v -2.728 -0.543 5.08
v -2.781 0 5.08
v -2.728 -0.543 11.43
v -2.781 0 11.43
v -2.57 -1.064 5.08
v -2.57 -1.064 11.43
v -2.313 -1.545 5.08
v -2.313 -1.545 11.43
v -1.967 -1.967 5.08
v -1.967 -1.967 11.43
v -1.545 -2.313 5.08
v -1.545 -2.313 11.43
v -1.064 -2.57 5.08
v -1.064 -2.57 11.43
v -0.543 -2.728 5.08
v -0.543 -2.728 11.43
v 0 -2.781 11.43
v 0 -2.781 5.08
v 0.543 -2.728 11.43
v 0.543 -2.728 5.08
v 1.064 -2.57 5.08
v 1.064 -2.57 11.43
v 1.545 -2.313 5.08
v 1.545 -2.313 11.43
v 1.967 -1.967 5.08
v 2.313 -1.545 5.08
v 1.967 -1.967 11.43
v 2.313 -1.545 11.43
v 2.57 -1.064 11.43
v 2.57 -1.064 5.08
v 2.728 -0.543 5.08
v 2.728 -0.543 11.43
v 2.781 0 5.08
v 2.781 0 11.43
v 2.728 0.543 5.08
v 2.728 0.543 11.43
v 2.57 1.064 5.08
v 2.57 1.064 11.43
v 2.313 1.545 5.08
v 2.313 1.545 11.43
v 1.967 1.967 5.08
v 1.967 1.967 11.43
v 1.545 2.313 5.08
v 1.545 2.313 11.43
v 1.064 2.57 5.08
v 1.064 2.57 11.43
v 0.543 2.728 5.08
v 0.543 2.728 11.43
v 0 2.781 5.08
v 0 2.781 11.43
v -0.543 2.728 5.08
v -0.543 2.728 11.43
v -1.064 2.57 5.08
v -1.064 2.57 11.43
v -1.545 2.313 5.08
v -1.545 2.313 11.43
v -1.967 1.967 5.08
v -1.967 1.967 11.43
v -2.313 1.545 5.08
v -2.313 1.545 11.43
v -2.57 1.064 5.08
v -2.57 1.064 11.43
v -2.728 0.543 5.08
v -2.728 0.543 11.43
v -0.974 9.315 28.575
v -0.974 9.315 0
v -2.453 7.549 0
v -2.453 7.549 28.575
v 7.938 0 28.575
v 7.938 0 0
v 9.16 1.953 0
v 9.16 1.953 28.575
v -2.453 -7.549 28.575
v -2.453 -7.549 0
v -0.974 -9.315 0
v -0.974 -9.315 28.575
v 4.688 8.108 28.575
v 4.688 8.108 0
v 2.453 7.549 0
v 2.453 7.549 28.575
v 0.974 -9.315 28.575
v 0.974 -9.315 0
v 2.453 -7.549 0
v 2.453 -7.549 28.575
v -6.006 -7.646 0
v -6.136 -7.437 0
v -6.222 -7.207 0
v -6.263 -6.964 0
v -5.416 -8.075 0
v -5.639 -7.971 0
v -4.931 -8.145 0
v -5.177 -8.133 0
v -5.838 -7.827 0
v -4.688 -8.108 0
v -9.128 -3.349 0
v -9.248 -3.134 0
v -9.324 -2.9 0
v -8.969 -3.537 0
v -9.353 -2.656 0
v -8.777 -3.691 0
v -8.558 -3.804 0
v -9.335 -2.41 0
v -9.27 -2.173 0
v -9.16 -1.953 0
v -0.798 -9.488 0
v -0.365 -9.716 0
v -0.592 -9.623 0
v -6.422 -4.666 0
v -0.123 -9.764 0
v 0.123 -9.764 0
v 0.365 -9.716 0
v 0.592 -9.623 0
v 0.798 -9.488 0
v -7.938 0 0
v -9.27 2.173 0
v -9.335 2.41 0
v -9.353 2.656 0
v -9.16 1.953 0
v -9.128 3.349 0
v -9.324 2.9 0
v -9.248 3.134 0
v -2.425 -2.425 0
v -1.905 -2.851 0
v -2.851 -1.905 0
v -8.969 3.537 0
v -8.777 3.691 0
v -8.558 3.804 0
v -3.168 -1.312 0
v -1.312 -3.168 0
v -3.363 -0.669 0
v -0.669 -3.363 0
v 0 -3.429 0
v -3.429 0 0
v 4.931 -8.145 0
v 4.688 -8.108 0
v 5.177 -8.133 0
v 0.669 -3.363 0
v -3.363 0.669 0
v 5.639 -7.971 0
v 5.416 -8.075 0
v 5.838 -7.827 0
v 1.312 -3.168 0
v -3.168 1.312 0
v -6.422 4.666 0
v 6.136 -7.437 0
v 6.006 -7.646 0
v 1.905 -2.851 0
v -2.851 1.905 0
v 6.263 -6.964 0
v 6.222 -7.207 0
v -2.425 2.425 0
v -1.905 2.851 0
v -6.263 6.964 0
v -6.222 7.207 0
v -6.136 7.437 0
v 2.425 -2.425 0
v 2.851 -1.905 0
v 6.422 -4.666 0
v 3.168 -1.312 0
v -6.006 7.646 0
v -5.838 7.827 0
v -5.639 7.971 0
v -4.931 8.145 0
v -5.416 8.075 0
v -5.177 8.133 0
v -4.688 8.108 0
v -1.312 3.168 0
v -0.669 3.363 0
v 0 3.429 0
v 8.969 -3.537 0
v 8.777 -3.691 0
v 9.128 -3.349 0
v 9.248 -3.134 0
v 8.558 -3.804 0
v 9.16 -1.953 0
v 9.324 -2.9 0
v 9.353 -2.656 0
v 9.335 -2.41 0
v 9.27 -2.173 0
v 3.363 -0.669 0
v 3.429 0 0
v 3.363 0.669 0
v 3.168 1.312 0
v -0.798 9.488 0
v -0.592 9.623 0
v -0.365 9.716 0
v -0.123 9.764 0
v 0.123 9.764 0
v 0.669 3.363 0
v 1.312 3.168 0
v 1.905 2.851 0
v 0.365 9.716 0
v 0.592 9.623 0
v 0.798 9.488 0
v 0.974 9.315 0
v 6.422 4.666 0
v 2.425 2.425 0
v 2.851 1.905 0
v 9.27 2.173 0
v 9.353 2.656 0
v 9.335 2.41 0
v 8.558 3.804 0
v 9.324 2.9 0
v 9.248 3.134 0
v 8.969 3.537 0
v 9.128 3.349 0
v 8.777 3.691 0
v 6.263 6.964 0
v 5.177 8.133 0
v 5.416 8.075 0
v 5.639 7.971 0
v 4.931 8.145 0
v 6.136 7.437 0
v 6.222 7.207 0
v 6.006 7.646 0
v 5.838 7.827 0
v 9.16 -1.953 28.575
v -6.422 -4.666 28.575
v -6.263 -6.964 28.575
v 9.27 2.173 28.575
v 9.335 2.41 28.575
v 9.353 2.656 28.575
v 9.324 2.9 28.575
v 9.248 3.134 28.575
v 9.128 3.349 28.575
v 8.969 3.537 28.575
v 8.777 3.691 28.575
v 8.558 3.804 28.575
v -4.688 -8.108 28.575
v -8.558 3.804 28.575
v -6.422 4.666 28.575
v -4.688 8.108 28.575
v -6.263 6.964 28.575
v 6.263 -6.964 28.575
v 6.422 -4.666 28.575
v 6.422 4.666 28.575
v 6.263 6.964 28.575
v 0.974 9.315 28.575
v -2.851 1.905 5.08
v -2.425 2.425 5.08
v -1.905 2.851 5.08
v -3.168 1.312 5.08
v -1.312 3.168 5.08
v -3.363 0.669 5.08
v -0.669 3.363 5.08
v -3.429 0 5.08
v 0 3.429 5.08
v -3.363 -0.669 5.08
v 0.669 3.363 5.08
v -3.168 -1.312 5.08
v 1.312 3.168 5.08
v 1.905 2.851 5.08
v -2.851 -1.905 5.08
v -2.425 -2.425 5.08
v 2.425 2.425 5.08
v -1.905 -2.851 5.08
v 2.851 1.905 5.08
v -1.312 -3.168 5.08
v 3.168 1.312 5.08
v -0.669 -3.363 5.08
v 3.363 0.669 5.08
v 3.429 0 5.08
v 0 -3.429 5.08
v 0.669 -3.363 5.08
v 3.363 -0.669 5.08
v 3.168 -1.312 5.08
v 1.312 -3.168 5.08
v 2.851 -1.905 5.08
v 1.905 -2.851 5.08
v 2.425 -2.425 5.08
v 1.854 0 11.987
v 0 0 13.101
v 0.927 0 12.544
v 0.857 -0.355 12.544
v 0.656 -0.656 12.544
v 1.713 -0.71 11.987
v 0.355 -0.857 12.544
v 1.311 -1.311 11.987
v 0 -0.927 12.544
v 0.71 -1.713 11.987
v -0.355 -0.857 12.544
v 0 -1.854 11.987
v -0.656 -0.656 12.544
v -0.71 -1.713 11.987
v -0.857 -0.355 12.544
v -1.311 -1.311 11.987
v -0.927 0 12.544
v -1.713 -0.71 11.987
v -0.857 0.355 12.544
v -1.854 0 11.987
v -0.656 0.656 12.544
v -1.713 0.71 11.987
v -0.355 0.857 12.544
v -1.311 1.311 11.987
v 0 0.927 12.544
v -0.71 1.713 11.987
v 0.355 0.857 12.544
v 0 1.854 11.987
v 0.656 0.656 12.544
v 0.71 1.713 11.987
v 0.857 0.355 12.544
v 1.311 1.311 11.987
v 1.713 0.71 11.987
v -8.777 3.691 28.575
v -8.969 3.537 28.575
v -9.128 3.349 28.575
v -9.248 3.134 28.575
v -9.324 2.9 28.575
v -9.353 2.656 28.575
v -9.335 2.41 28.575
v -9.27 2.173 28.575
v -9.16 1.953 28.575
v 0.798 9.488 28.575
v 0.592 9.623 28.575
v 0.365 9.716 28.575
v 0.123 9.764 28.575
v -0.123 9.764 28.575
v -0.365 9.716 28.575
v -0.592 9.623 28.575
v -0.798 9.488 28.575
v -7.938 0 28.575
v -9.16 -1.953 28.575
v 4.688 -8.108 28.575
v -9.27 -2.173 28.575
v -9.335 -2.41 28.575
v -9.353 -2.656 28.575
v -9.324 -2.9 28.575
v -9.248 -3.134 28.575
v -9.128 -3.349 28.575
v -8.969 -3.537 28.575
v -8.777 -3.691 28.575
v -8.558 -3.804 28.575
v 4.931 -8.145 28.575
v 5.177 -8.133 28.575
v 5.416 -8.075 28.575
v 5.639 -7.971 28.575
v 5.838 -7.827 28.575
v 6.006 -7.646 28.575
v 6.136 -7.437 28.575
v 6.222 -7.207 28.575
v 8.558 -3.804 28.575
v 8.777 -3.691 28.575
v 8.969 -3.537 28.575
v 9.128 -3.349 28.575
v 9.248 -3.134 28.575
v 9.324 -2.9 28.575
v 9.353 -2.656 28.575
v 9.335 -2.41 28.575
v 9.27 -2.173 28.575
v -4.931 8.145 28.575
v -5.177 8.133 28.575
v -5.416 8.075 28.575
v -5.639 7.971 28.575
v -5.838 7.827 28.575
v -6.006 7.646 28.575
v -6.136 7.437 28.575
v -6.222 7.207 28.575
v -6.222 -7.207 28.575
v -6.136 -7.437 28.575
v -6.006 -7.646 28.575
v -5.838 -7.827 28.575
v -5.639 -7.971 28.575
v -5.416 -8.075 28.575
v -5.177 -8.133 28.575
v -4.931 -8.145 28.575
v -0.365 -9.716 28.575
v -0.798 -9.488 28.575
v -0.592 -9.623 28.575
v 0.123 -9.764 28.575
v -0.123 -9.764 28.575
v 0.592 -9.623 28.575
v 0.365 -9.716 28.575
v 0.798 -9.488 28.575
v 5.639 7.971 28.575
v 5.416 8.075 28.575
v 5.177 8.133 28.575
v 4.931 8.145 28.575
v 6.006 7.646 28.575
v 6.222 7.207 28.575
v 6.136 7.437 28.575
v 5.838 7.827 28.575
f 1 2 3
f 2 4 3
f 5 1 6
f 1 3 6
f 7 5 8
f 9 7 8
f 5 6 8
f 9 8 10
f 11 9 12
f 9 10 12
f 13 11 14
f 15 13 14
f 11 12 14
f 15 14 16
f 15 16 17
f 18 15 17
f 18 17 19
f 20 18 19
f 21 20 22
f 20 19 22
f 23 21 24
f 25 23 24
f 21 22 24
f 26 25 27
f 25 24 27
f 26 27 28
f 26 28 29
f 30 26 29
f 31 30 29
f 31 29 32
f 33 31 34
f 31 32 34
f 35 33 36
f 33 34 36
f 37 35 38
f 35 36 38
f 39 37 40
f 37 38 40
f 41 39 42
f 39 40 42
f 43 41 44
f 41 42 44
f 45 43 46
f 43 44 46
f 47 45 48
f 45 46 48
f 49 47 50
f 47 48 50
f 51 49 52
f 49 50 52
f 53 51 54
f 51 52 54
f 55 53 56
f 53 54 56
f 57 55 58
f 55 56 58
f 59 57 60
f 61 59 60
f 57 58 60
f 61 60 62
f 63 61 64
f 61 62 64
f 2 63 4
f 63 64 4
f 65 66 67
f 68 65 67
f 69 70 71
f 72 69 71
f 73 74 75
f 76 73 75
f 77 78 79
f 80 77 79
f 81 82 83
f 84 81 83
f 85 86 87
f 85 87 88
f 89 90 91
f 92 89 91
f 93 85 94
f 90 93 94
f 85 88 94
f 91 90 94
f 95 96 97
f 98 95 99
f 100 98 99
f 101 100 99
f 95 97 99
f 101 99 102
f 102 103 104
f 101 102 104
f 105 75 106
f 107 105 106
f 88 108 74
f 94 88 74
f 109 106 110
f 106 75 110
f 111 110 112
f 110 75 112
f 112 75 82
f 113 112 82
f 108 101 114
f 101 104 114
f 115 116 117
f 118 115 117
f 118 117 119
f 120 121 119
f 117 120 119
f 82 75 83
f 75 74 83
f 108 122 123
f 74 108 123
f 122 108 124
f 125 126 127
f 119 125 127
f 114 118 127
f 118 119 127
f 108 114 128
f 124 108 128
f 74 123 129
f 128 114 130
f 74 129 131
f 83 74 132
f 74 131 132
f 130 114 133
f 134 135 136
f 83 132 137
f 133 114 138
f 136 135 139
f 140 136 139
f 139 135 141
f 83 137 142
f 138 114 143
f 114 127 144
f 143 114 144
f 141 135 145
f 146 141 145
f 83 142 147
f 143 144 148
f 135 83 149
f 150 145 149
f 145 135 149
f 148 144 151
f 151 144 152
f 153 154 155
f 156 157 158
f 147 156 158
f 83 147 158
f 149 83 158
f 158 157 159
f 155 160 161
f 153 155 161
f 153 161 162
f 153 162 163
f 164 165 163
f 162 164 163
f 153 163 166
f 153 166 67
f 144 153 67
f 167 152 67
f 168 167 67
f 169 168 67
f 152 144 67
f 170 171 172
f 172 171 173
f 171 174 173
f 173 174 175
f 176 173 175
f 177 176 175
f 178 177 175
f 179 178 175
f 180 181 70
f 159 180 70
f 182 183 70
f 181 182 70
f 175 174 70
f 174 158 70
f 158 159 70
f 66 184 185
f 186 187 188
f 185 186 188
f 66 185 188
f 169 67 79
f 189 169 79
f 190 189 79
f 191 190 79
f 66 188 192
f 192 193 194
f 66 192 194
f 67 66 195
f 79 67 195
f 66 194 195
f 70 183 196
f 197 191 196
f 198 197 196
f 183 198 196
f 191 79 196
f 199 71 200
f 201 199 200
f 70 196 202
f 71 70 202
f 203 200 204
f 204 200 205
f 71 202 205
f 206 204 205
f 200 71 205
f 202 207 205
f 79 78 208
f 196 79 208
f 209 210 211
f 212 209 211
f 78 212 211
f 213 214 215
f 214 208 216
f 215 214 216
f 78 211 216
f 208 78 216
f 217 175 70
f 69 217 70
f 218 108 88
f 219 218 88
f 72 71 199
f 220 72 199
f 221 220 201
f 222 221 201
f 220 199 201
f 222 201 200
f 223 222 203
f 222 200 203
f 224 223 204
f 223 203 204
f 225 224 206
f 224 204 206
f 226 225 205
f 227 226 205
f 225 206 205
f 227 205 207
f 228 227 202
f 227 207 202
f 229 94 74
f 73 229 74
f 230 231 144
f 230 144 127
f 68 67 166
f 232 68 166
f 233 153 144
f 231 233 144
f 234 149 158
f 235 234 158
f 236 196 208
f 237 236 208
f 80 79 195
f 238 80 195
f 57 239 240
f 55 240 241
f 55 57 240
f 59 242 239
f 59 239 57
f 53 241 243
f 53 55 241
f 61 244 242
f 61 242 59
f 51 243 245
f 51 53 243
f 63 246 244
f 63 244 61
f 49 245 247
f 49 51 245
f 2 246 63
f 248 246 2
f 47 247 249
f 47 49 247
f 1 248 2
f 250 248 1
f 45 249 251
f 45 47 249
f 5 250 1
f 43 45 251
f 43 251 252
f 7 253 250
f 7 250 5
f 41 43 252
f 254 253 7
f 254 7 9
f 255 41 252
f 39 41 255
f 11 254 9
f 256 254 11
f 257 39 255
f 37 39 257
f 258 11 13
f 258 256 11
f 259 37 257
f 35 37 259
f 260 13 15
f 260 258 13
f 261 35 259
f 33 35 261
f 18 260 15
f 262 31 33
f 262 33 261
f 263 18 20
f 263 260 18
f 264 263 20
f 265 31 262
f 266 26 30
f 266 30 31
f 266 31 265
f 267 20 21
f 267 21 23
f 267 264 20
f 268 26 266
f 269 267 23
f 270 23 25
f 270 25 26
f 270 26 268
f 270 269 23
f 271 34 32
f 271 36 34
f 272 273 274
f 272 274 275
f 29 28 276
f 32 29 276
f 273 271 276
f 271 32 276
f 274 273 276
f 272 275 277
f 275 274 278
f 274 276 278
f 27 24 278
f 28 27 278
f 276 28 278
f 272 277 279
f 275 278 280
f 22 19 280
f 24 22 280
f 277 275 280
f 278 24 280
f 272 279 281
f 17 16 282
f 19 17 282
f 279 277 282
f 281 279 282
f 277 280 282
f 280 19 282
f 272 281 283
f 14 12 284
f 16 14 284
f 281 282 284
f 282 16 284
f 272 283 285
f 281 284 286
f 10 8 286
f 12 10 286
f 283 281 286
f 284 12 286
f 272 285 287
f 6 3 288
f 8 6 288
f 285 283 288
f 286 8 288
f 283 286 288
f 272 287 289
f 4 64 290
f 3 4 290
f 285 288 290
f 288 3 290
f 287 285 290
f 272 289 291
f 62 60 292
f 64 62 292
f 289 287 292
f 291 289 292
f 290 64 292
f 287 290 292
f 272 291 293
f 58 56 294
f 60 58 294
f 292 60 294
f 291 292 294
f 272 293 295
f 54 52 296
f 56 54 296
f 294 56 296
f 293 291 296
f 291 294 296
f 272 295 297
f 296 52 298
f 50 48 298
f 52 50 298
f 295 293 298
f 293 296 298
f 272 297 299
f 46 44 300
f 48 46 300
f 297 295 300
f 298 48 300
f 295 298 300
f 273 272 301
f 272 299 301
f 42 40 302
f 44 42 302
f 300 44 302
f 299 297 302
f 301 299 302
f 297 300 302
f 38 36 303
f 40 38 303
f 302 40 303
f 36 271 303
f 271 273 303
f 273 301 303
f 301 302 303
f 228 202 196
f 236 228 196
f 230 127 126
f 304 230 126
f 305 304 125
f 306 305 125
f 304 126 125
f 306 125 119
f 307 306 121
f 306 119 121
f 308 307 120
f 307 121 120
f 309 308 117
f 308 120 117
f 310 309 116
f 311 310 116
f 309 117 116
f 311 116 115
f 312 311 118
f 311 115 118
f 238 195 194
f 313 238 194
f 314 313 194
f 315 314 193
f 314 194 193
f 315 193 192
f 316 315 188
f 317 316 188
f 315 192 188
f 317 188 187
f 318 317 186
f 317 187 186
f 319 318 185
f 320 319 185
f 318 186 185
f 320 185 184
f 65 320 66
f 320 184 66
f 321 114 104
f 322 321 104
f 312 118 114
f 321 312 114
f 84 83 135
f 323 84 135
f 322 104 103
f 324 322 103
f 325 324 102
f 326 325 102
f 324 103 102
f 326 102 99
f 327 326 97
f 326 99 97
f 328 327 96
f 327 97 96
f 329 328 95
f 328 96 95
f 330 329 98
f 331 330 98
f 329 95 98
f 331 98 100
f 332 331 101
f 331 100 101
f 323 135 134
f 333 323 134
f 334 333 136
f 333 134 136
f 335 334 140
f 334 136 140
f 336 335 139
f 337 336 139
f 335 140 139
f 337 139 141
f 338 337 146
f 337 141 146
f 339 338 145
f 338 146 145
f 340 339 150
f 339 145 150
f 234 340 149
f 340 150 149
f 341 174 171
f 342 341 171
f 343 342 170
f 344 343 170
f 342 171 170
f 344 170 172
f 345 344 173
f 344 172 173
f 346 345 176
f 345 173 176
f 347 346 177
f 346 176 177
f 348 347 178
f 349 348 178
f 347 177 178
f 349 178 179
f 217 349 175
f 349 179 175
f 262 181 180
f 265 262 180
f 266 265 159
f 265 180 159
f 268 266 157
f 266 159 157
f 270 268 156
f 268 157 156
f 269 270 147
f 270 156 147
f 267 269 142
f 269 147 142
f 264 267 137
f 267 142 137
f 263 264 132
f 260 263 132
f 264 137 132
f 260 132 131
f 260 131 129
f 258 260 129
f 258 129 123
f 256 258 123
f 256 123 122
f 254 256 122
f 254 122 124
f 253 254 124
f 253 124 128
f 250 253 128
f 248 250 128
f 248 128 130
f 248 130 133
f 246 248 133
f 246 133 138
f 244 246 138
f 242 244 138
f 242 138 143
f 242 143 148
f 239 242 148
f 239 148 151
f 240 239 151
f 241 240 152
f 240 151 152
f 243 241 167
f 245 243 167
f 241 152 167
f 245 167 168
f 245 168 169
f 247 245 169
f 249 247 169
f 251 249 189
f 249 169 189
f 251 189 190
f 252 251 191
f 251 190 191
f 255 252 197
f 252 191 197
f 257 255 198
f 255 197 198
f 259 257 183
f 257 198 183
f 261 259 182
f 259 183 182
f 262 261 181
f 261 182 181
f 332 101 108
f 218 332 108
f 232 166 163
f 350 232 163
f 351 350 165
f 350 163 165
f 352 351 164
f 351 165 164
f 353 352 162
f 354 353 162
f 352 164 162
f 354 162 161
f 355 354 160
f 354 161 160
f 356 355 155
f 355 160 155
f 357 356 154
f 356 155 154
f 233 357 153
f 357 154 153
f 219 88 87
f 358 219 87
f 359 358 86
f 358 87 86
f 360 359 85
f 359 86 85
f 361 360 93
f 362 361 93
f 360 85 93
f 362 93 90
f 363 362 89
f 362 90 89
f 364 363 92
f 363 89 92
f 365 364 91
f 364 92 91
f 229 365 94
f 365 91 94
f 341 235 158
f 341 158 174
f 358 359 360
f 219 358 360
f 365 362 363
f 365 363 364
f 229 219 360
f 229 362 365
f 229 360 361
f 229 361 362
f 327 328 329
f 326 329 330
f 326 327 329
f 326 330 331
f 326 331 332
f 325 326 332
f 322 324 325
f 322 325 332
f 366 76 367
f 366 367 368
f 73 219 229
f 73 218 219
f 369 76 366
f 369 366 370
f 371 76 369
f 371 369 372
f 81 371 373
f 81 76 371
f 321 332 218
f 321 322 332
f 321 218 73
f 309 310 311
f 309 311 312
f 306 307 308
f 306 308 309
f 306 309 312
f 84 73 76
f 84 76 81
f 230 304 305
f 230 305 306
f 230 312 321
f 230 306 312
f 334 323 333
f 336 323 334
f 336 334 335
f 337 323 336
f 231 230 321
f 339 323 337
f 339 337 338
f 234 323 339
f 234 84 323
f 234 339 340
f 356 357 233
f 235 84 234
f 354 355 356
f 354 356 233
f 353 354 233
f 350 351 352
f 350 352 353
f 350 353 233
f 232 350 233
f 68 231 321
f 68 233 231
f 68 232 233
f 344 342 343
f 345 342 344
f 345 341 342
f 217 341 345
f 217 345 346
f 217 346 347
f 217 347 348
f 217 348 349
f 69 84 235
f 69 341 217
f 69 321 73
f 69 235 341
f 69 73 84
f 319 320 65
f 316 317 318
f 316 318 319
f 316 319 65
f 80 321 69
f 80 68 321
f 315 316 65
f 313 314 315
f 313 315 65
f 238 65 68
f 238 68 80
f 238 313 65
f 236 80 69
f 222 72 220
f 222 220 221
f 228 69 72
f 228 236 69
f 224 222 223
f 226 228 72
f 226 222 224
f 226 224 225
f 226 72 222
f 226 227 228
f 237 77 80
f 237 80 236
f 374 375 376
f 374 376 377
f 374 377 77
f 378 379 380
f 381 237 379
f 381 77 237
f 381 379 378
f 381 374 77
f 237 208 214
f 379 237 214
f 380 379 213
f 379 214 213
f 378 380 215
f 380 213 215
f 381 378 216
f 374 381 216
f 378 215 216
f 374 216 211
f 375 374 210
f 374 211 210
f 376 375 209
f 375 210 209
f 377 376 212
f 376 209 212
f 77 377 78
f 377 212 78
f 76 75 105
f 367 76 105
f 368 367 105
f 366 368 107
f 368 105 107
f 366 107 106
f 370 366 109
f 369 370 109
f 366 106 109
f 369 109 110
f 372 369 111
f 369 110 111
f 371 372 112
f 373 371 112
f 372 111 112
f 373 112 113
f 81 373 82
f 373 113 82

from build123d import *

# Parameters (mm, degrees)
F1_DEPTH       = 28.575
F3_D           = 5.5626
F3_DEPTH       = 11.43
F3_CBORE_D     = 6.858
F3_CBORE_DEPTH = 5.08
F3_TIP         = 1.6711736397


with BuildPart() as f1:
    # F0 (on Top) → F1 (new body)
    with BuildSketch(Plane.XY):
        with BuildLine():
            Line((2.4528223929, 7.5490110981), (0.9736080693, 9.3150838242))
            ThreePointArc((0.9736080693, 9.3150838242), (0, 9.7696162728), (-0.9736080693, 9.3150838242))
            Line((-0.9736080693, 9.3150838242), (-2.4528223929, 7.5490110981))
            Line((-2.4528223929, 7.5490110981), (-4.6876034218, 8.1083335825))
            ThreePointArc((-4.6876034218, 8.1083335825), (-5.7424363657, 7.9037855932), (-6.2629343697, 6.9637886532))
            Line((-6.2629343697, 6.9637886532), (-6.4215723929, 4.6655454401))
            Line((-6.4215723929, 4.6655454401), (-8.5583097316, 3.8044755043))
            ThreePointArc((-8.5583097316, 3.8044755043), (-9.291457218, 3.0189774568), (-9.1600326102, 1.9525629071))
            Line((-9.1600326102, 1.9525629071), (-7.9375, 0))
            Line((-7.9375, 0), (-9.1600326102, -1.9525629071))
            ThreePointArc((-9.1600326102, -1.9525629071), (-9.291457218, -3.0189774568), (-8.5583097316, -3.8044755043))
            Line((-8.5583097316, -3.8044755043), (-6.4215723929, -4.6655454401))
            Line((-6.4215723929, -4.6655454401), (-6.2629343697, -6.9637886532))
            ThreePointArc((-6.2629343697, -6.9637886532), (-5.7424363657, -7.9037855932), (-4.6876034218, -8.1083335825))
            Line((-4.6876034218, -8.1083335825), (-2.4528223929, -7.5490110981))
            Line((-2.4528223929, -7.5490110981), (-0.9736080693, -9.3150838242))
            ThreePointArc((-0.9736080693, -9.3150838242), (0, -9.7696162728), (0.9736080693, -9.3150838242))
            Line((0.9736080693, -9.3150838242), (2.4528223929, -7.5490110981))
            Line((2.4528223929, -7.5490110981), (4.6876034218, -8.1083335825))
            ThreePointArc((4.6876034218, -8.1083335825), (5.7424363657, -7.9037855932), (6.2629343697, -6.9637886532))
            Line((6.2629343697, -6.9637886532), (6.4215723929, -4.6655454401))
            Line((6.4215723929, -4.6655454401), (8.5583097316, -3.8044755043))
            ThreePointArc((8.5583097316, -3.8044755043), (9.291457218, -3.0189774568), (9.1600326102, -1.9525629071))
            Line((9.1600326102, -1.9525629071), (7.9375, 0))
            Line((7.9375, 0), (9.1600326102, 1.9525629071))
            ThreePointArc((9.1600326102, 1.9525629071), (9.291457218, 3.0189774568), (8.5583097316, 3.8044755043))
            Line((8.5583097316, 3.8044755043), (6.4215723929, 4.6655454401))
            Line((6.4215723929, 4.6655454401), (6.2629343697, 6.9637886532))
            ThreePointArc((6.2629343697, 6.9637886532), (5.7424363657, 7.9037855932), (4.6876034218, 8.1083335825))
            Line((4.6876034218, 8.1083335825), (2.4528223929, 7.5490110981))
        make_face()
    extrude(amount=F1_DEPTH)

    # F3
    with Locations(Plane(origin=(0, 0, 0), x_dir=(1, 0, 0), z_dir=(0, 0, -1))):
        with Locations((0, 0)):
            CounterBoreHole(F3_D / 2, F3_CBORE_D / 2, F3_CBORE_DEPTH, depth=F3_DEPTH)
            with Locations((0, 0, -(F3_DEPTH + F3_TIP / 2))):  # 118° drill point
                Cone(0, F3_D / 2, F3_TIP, mode=Mode.SUBTRACT)


solid = f1.part
